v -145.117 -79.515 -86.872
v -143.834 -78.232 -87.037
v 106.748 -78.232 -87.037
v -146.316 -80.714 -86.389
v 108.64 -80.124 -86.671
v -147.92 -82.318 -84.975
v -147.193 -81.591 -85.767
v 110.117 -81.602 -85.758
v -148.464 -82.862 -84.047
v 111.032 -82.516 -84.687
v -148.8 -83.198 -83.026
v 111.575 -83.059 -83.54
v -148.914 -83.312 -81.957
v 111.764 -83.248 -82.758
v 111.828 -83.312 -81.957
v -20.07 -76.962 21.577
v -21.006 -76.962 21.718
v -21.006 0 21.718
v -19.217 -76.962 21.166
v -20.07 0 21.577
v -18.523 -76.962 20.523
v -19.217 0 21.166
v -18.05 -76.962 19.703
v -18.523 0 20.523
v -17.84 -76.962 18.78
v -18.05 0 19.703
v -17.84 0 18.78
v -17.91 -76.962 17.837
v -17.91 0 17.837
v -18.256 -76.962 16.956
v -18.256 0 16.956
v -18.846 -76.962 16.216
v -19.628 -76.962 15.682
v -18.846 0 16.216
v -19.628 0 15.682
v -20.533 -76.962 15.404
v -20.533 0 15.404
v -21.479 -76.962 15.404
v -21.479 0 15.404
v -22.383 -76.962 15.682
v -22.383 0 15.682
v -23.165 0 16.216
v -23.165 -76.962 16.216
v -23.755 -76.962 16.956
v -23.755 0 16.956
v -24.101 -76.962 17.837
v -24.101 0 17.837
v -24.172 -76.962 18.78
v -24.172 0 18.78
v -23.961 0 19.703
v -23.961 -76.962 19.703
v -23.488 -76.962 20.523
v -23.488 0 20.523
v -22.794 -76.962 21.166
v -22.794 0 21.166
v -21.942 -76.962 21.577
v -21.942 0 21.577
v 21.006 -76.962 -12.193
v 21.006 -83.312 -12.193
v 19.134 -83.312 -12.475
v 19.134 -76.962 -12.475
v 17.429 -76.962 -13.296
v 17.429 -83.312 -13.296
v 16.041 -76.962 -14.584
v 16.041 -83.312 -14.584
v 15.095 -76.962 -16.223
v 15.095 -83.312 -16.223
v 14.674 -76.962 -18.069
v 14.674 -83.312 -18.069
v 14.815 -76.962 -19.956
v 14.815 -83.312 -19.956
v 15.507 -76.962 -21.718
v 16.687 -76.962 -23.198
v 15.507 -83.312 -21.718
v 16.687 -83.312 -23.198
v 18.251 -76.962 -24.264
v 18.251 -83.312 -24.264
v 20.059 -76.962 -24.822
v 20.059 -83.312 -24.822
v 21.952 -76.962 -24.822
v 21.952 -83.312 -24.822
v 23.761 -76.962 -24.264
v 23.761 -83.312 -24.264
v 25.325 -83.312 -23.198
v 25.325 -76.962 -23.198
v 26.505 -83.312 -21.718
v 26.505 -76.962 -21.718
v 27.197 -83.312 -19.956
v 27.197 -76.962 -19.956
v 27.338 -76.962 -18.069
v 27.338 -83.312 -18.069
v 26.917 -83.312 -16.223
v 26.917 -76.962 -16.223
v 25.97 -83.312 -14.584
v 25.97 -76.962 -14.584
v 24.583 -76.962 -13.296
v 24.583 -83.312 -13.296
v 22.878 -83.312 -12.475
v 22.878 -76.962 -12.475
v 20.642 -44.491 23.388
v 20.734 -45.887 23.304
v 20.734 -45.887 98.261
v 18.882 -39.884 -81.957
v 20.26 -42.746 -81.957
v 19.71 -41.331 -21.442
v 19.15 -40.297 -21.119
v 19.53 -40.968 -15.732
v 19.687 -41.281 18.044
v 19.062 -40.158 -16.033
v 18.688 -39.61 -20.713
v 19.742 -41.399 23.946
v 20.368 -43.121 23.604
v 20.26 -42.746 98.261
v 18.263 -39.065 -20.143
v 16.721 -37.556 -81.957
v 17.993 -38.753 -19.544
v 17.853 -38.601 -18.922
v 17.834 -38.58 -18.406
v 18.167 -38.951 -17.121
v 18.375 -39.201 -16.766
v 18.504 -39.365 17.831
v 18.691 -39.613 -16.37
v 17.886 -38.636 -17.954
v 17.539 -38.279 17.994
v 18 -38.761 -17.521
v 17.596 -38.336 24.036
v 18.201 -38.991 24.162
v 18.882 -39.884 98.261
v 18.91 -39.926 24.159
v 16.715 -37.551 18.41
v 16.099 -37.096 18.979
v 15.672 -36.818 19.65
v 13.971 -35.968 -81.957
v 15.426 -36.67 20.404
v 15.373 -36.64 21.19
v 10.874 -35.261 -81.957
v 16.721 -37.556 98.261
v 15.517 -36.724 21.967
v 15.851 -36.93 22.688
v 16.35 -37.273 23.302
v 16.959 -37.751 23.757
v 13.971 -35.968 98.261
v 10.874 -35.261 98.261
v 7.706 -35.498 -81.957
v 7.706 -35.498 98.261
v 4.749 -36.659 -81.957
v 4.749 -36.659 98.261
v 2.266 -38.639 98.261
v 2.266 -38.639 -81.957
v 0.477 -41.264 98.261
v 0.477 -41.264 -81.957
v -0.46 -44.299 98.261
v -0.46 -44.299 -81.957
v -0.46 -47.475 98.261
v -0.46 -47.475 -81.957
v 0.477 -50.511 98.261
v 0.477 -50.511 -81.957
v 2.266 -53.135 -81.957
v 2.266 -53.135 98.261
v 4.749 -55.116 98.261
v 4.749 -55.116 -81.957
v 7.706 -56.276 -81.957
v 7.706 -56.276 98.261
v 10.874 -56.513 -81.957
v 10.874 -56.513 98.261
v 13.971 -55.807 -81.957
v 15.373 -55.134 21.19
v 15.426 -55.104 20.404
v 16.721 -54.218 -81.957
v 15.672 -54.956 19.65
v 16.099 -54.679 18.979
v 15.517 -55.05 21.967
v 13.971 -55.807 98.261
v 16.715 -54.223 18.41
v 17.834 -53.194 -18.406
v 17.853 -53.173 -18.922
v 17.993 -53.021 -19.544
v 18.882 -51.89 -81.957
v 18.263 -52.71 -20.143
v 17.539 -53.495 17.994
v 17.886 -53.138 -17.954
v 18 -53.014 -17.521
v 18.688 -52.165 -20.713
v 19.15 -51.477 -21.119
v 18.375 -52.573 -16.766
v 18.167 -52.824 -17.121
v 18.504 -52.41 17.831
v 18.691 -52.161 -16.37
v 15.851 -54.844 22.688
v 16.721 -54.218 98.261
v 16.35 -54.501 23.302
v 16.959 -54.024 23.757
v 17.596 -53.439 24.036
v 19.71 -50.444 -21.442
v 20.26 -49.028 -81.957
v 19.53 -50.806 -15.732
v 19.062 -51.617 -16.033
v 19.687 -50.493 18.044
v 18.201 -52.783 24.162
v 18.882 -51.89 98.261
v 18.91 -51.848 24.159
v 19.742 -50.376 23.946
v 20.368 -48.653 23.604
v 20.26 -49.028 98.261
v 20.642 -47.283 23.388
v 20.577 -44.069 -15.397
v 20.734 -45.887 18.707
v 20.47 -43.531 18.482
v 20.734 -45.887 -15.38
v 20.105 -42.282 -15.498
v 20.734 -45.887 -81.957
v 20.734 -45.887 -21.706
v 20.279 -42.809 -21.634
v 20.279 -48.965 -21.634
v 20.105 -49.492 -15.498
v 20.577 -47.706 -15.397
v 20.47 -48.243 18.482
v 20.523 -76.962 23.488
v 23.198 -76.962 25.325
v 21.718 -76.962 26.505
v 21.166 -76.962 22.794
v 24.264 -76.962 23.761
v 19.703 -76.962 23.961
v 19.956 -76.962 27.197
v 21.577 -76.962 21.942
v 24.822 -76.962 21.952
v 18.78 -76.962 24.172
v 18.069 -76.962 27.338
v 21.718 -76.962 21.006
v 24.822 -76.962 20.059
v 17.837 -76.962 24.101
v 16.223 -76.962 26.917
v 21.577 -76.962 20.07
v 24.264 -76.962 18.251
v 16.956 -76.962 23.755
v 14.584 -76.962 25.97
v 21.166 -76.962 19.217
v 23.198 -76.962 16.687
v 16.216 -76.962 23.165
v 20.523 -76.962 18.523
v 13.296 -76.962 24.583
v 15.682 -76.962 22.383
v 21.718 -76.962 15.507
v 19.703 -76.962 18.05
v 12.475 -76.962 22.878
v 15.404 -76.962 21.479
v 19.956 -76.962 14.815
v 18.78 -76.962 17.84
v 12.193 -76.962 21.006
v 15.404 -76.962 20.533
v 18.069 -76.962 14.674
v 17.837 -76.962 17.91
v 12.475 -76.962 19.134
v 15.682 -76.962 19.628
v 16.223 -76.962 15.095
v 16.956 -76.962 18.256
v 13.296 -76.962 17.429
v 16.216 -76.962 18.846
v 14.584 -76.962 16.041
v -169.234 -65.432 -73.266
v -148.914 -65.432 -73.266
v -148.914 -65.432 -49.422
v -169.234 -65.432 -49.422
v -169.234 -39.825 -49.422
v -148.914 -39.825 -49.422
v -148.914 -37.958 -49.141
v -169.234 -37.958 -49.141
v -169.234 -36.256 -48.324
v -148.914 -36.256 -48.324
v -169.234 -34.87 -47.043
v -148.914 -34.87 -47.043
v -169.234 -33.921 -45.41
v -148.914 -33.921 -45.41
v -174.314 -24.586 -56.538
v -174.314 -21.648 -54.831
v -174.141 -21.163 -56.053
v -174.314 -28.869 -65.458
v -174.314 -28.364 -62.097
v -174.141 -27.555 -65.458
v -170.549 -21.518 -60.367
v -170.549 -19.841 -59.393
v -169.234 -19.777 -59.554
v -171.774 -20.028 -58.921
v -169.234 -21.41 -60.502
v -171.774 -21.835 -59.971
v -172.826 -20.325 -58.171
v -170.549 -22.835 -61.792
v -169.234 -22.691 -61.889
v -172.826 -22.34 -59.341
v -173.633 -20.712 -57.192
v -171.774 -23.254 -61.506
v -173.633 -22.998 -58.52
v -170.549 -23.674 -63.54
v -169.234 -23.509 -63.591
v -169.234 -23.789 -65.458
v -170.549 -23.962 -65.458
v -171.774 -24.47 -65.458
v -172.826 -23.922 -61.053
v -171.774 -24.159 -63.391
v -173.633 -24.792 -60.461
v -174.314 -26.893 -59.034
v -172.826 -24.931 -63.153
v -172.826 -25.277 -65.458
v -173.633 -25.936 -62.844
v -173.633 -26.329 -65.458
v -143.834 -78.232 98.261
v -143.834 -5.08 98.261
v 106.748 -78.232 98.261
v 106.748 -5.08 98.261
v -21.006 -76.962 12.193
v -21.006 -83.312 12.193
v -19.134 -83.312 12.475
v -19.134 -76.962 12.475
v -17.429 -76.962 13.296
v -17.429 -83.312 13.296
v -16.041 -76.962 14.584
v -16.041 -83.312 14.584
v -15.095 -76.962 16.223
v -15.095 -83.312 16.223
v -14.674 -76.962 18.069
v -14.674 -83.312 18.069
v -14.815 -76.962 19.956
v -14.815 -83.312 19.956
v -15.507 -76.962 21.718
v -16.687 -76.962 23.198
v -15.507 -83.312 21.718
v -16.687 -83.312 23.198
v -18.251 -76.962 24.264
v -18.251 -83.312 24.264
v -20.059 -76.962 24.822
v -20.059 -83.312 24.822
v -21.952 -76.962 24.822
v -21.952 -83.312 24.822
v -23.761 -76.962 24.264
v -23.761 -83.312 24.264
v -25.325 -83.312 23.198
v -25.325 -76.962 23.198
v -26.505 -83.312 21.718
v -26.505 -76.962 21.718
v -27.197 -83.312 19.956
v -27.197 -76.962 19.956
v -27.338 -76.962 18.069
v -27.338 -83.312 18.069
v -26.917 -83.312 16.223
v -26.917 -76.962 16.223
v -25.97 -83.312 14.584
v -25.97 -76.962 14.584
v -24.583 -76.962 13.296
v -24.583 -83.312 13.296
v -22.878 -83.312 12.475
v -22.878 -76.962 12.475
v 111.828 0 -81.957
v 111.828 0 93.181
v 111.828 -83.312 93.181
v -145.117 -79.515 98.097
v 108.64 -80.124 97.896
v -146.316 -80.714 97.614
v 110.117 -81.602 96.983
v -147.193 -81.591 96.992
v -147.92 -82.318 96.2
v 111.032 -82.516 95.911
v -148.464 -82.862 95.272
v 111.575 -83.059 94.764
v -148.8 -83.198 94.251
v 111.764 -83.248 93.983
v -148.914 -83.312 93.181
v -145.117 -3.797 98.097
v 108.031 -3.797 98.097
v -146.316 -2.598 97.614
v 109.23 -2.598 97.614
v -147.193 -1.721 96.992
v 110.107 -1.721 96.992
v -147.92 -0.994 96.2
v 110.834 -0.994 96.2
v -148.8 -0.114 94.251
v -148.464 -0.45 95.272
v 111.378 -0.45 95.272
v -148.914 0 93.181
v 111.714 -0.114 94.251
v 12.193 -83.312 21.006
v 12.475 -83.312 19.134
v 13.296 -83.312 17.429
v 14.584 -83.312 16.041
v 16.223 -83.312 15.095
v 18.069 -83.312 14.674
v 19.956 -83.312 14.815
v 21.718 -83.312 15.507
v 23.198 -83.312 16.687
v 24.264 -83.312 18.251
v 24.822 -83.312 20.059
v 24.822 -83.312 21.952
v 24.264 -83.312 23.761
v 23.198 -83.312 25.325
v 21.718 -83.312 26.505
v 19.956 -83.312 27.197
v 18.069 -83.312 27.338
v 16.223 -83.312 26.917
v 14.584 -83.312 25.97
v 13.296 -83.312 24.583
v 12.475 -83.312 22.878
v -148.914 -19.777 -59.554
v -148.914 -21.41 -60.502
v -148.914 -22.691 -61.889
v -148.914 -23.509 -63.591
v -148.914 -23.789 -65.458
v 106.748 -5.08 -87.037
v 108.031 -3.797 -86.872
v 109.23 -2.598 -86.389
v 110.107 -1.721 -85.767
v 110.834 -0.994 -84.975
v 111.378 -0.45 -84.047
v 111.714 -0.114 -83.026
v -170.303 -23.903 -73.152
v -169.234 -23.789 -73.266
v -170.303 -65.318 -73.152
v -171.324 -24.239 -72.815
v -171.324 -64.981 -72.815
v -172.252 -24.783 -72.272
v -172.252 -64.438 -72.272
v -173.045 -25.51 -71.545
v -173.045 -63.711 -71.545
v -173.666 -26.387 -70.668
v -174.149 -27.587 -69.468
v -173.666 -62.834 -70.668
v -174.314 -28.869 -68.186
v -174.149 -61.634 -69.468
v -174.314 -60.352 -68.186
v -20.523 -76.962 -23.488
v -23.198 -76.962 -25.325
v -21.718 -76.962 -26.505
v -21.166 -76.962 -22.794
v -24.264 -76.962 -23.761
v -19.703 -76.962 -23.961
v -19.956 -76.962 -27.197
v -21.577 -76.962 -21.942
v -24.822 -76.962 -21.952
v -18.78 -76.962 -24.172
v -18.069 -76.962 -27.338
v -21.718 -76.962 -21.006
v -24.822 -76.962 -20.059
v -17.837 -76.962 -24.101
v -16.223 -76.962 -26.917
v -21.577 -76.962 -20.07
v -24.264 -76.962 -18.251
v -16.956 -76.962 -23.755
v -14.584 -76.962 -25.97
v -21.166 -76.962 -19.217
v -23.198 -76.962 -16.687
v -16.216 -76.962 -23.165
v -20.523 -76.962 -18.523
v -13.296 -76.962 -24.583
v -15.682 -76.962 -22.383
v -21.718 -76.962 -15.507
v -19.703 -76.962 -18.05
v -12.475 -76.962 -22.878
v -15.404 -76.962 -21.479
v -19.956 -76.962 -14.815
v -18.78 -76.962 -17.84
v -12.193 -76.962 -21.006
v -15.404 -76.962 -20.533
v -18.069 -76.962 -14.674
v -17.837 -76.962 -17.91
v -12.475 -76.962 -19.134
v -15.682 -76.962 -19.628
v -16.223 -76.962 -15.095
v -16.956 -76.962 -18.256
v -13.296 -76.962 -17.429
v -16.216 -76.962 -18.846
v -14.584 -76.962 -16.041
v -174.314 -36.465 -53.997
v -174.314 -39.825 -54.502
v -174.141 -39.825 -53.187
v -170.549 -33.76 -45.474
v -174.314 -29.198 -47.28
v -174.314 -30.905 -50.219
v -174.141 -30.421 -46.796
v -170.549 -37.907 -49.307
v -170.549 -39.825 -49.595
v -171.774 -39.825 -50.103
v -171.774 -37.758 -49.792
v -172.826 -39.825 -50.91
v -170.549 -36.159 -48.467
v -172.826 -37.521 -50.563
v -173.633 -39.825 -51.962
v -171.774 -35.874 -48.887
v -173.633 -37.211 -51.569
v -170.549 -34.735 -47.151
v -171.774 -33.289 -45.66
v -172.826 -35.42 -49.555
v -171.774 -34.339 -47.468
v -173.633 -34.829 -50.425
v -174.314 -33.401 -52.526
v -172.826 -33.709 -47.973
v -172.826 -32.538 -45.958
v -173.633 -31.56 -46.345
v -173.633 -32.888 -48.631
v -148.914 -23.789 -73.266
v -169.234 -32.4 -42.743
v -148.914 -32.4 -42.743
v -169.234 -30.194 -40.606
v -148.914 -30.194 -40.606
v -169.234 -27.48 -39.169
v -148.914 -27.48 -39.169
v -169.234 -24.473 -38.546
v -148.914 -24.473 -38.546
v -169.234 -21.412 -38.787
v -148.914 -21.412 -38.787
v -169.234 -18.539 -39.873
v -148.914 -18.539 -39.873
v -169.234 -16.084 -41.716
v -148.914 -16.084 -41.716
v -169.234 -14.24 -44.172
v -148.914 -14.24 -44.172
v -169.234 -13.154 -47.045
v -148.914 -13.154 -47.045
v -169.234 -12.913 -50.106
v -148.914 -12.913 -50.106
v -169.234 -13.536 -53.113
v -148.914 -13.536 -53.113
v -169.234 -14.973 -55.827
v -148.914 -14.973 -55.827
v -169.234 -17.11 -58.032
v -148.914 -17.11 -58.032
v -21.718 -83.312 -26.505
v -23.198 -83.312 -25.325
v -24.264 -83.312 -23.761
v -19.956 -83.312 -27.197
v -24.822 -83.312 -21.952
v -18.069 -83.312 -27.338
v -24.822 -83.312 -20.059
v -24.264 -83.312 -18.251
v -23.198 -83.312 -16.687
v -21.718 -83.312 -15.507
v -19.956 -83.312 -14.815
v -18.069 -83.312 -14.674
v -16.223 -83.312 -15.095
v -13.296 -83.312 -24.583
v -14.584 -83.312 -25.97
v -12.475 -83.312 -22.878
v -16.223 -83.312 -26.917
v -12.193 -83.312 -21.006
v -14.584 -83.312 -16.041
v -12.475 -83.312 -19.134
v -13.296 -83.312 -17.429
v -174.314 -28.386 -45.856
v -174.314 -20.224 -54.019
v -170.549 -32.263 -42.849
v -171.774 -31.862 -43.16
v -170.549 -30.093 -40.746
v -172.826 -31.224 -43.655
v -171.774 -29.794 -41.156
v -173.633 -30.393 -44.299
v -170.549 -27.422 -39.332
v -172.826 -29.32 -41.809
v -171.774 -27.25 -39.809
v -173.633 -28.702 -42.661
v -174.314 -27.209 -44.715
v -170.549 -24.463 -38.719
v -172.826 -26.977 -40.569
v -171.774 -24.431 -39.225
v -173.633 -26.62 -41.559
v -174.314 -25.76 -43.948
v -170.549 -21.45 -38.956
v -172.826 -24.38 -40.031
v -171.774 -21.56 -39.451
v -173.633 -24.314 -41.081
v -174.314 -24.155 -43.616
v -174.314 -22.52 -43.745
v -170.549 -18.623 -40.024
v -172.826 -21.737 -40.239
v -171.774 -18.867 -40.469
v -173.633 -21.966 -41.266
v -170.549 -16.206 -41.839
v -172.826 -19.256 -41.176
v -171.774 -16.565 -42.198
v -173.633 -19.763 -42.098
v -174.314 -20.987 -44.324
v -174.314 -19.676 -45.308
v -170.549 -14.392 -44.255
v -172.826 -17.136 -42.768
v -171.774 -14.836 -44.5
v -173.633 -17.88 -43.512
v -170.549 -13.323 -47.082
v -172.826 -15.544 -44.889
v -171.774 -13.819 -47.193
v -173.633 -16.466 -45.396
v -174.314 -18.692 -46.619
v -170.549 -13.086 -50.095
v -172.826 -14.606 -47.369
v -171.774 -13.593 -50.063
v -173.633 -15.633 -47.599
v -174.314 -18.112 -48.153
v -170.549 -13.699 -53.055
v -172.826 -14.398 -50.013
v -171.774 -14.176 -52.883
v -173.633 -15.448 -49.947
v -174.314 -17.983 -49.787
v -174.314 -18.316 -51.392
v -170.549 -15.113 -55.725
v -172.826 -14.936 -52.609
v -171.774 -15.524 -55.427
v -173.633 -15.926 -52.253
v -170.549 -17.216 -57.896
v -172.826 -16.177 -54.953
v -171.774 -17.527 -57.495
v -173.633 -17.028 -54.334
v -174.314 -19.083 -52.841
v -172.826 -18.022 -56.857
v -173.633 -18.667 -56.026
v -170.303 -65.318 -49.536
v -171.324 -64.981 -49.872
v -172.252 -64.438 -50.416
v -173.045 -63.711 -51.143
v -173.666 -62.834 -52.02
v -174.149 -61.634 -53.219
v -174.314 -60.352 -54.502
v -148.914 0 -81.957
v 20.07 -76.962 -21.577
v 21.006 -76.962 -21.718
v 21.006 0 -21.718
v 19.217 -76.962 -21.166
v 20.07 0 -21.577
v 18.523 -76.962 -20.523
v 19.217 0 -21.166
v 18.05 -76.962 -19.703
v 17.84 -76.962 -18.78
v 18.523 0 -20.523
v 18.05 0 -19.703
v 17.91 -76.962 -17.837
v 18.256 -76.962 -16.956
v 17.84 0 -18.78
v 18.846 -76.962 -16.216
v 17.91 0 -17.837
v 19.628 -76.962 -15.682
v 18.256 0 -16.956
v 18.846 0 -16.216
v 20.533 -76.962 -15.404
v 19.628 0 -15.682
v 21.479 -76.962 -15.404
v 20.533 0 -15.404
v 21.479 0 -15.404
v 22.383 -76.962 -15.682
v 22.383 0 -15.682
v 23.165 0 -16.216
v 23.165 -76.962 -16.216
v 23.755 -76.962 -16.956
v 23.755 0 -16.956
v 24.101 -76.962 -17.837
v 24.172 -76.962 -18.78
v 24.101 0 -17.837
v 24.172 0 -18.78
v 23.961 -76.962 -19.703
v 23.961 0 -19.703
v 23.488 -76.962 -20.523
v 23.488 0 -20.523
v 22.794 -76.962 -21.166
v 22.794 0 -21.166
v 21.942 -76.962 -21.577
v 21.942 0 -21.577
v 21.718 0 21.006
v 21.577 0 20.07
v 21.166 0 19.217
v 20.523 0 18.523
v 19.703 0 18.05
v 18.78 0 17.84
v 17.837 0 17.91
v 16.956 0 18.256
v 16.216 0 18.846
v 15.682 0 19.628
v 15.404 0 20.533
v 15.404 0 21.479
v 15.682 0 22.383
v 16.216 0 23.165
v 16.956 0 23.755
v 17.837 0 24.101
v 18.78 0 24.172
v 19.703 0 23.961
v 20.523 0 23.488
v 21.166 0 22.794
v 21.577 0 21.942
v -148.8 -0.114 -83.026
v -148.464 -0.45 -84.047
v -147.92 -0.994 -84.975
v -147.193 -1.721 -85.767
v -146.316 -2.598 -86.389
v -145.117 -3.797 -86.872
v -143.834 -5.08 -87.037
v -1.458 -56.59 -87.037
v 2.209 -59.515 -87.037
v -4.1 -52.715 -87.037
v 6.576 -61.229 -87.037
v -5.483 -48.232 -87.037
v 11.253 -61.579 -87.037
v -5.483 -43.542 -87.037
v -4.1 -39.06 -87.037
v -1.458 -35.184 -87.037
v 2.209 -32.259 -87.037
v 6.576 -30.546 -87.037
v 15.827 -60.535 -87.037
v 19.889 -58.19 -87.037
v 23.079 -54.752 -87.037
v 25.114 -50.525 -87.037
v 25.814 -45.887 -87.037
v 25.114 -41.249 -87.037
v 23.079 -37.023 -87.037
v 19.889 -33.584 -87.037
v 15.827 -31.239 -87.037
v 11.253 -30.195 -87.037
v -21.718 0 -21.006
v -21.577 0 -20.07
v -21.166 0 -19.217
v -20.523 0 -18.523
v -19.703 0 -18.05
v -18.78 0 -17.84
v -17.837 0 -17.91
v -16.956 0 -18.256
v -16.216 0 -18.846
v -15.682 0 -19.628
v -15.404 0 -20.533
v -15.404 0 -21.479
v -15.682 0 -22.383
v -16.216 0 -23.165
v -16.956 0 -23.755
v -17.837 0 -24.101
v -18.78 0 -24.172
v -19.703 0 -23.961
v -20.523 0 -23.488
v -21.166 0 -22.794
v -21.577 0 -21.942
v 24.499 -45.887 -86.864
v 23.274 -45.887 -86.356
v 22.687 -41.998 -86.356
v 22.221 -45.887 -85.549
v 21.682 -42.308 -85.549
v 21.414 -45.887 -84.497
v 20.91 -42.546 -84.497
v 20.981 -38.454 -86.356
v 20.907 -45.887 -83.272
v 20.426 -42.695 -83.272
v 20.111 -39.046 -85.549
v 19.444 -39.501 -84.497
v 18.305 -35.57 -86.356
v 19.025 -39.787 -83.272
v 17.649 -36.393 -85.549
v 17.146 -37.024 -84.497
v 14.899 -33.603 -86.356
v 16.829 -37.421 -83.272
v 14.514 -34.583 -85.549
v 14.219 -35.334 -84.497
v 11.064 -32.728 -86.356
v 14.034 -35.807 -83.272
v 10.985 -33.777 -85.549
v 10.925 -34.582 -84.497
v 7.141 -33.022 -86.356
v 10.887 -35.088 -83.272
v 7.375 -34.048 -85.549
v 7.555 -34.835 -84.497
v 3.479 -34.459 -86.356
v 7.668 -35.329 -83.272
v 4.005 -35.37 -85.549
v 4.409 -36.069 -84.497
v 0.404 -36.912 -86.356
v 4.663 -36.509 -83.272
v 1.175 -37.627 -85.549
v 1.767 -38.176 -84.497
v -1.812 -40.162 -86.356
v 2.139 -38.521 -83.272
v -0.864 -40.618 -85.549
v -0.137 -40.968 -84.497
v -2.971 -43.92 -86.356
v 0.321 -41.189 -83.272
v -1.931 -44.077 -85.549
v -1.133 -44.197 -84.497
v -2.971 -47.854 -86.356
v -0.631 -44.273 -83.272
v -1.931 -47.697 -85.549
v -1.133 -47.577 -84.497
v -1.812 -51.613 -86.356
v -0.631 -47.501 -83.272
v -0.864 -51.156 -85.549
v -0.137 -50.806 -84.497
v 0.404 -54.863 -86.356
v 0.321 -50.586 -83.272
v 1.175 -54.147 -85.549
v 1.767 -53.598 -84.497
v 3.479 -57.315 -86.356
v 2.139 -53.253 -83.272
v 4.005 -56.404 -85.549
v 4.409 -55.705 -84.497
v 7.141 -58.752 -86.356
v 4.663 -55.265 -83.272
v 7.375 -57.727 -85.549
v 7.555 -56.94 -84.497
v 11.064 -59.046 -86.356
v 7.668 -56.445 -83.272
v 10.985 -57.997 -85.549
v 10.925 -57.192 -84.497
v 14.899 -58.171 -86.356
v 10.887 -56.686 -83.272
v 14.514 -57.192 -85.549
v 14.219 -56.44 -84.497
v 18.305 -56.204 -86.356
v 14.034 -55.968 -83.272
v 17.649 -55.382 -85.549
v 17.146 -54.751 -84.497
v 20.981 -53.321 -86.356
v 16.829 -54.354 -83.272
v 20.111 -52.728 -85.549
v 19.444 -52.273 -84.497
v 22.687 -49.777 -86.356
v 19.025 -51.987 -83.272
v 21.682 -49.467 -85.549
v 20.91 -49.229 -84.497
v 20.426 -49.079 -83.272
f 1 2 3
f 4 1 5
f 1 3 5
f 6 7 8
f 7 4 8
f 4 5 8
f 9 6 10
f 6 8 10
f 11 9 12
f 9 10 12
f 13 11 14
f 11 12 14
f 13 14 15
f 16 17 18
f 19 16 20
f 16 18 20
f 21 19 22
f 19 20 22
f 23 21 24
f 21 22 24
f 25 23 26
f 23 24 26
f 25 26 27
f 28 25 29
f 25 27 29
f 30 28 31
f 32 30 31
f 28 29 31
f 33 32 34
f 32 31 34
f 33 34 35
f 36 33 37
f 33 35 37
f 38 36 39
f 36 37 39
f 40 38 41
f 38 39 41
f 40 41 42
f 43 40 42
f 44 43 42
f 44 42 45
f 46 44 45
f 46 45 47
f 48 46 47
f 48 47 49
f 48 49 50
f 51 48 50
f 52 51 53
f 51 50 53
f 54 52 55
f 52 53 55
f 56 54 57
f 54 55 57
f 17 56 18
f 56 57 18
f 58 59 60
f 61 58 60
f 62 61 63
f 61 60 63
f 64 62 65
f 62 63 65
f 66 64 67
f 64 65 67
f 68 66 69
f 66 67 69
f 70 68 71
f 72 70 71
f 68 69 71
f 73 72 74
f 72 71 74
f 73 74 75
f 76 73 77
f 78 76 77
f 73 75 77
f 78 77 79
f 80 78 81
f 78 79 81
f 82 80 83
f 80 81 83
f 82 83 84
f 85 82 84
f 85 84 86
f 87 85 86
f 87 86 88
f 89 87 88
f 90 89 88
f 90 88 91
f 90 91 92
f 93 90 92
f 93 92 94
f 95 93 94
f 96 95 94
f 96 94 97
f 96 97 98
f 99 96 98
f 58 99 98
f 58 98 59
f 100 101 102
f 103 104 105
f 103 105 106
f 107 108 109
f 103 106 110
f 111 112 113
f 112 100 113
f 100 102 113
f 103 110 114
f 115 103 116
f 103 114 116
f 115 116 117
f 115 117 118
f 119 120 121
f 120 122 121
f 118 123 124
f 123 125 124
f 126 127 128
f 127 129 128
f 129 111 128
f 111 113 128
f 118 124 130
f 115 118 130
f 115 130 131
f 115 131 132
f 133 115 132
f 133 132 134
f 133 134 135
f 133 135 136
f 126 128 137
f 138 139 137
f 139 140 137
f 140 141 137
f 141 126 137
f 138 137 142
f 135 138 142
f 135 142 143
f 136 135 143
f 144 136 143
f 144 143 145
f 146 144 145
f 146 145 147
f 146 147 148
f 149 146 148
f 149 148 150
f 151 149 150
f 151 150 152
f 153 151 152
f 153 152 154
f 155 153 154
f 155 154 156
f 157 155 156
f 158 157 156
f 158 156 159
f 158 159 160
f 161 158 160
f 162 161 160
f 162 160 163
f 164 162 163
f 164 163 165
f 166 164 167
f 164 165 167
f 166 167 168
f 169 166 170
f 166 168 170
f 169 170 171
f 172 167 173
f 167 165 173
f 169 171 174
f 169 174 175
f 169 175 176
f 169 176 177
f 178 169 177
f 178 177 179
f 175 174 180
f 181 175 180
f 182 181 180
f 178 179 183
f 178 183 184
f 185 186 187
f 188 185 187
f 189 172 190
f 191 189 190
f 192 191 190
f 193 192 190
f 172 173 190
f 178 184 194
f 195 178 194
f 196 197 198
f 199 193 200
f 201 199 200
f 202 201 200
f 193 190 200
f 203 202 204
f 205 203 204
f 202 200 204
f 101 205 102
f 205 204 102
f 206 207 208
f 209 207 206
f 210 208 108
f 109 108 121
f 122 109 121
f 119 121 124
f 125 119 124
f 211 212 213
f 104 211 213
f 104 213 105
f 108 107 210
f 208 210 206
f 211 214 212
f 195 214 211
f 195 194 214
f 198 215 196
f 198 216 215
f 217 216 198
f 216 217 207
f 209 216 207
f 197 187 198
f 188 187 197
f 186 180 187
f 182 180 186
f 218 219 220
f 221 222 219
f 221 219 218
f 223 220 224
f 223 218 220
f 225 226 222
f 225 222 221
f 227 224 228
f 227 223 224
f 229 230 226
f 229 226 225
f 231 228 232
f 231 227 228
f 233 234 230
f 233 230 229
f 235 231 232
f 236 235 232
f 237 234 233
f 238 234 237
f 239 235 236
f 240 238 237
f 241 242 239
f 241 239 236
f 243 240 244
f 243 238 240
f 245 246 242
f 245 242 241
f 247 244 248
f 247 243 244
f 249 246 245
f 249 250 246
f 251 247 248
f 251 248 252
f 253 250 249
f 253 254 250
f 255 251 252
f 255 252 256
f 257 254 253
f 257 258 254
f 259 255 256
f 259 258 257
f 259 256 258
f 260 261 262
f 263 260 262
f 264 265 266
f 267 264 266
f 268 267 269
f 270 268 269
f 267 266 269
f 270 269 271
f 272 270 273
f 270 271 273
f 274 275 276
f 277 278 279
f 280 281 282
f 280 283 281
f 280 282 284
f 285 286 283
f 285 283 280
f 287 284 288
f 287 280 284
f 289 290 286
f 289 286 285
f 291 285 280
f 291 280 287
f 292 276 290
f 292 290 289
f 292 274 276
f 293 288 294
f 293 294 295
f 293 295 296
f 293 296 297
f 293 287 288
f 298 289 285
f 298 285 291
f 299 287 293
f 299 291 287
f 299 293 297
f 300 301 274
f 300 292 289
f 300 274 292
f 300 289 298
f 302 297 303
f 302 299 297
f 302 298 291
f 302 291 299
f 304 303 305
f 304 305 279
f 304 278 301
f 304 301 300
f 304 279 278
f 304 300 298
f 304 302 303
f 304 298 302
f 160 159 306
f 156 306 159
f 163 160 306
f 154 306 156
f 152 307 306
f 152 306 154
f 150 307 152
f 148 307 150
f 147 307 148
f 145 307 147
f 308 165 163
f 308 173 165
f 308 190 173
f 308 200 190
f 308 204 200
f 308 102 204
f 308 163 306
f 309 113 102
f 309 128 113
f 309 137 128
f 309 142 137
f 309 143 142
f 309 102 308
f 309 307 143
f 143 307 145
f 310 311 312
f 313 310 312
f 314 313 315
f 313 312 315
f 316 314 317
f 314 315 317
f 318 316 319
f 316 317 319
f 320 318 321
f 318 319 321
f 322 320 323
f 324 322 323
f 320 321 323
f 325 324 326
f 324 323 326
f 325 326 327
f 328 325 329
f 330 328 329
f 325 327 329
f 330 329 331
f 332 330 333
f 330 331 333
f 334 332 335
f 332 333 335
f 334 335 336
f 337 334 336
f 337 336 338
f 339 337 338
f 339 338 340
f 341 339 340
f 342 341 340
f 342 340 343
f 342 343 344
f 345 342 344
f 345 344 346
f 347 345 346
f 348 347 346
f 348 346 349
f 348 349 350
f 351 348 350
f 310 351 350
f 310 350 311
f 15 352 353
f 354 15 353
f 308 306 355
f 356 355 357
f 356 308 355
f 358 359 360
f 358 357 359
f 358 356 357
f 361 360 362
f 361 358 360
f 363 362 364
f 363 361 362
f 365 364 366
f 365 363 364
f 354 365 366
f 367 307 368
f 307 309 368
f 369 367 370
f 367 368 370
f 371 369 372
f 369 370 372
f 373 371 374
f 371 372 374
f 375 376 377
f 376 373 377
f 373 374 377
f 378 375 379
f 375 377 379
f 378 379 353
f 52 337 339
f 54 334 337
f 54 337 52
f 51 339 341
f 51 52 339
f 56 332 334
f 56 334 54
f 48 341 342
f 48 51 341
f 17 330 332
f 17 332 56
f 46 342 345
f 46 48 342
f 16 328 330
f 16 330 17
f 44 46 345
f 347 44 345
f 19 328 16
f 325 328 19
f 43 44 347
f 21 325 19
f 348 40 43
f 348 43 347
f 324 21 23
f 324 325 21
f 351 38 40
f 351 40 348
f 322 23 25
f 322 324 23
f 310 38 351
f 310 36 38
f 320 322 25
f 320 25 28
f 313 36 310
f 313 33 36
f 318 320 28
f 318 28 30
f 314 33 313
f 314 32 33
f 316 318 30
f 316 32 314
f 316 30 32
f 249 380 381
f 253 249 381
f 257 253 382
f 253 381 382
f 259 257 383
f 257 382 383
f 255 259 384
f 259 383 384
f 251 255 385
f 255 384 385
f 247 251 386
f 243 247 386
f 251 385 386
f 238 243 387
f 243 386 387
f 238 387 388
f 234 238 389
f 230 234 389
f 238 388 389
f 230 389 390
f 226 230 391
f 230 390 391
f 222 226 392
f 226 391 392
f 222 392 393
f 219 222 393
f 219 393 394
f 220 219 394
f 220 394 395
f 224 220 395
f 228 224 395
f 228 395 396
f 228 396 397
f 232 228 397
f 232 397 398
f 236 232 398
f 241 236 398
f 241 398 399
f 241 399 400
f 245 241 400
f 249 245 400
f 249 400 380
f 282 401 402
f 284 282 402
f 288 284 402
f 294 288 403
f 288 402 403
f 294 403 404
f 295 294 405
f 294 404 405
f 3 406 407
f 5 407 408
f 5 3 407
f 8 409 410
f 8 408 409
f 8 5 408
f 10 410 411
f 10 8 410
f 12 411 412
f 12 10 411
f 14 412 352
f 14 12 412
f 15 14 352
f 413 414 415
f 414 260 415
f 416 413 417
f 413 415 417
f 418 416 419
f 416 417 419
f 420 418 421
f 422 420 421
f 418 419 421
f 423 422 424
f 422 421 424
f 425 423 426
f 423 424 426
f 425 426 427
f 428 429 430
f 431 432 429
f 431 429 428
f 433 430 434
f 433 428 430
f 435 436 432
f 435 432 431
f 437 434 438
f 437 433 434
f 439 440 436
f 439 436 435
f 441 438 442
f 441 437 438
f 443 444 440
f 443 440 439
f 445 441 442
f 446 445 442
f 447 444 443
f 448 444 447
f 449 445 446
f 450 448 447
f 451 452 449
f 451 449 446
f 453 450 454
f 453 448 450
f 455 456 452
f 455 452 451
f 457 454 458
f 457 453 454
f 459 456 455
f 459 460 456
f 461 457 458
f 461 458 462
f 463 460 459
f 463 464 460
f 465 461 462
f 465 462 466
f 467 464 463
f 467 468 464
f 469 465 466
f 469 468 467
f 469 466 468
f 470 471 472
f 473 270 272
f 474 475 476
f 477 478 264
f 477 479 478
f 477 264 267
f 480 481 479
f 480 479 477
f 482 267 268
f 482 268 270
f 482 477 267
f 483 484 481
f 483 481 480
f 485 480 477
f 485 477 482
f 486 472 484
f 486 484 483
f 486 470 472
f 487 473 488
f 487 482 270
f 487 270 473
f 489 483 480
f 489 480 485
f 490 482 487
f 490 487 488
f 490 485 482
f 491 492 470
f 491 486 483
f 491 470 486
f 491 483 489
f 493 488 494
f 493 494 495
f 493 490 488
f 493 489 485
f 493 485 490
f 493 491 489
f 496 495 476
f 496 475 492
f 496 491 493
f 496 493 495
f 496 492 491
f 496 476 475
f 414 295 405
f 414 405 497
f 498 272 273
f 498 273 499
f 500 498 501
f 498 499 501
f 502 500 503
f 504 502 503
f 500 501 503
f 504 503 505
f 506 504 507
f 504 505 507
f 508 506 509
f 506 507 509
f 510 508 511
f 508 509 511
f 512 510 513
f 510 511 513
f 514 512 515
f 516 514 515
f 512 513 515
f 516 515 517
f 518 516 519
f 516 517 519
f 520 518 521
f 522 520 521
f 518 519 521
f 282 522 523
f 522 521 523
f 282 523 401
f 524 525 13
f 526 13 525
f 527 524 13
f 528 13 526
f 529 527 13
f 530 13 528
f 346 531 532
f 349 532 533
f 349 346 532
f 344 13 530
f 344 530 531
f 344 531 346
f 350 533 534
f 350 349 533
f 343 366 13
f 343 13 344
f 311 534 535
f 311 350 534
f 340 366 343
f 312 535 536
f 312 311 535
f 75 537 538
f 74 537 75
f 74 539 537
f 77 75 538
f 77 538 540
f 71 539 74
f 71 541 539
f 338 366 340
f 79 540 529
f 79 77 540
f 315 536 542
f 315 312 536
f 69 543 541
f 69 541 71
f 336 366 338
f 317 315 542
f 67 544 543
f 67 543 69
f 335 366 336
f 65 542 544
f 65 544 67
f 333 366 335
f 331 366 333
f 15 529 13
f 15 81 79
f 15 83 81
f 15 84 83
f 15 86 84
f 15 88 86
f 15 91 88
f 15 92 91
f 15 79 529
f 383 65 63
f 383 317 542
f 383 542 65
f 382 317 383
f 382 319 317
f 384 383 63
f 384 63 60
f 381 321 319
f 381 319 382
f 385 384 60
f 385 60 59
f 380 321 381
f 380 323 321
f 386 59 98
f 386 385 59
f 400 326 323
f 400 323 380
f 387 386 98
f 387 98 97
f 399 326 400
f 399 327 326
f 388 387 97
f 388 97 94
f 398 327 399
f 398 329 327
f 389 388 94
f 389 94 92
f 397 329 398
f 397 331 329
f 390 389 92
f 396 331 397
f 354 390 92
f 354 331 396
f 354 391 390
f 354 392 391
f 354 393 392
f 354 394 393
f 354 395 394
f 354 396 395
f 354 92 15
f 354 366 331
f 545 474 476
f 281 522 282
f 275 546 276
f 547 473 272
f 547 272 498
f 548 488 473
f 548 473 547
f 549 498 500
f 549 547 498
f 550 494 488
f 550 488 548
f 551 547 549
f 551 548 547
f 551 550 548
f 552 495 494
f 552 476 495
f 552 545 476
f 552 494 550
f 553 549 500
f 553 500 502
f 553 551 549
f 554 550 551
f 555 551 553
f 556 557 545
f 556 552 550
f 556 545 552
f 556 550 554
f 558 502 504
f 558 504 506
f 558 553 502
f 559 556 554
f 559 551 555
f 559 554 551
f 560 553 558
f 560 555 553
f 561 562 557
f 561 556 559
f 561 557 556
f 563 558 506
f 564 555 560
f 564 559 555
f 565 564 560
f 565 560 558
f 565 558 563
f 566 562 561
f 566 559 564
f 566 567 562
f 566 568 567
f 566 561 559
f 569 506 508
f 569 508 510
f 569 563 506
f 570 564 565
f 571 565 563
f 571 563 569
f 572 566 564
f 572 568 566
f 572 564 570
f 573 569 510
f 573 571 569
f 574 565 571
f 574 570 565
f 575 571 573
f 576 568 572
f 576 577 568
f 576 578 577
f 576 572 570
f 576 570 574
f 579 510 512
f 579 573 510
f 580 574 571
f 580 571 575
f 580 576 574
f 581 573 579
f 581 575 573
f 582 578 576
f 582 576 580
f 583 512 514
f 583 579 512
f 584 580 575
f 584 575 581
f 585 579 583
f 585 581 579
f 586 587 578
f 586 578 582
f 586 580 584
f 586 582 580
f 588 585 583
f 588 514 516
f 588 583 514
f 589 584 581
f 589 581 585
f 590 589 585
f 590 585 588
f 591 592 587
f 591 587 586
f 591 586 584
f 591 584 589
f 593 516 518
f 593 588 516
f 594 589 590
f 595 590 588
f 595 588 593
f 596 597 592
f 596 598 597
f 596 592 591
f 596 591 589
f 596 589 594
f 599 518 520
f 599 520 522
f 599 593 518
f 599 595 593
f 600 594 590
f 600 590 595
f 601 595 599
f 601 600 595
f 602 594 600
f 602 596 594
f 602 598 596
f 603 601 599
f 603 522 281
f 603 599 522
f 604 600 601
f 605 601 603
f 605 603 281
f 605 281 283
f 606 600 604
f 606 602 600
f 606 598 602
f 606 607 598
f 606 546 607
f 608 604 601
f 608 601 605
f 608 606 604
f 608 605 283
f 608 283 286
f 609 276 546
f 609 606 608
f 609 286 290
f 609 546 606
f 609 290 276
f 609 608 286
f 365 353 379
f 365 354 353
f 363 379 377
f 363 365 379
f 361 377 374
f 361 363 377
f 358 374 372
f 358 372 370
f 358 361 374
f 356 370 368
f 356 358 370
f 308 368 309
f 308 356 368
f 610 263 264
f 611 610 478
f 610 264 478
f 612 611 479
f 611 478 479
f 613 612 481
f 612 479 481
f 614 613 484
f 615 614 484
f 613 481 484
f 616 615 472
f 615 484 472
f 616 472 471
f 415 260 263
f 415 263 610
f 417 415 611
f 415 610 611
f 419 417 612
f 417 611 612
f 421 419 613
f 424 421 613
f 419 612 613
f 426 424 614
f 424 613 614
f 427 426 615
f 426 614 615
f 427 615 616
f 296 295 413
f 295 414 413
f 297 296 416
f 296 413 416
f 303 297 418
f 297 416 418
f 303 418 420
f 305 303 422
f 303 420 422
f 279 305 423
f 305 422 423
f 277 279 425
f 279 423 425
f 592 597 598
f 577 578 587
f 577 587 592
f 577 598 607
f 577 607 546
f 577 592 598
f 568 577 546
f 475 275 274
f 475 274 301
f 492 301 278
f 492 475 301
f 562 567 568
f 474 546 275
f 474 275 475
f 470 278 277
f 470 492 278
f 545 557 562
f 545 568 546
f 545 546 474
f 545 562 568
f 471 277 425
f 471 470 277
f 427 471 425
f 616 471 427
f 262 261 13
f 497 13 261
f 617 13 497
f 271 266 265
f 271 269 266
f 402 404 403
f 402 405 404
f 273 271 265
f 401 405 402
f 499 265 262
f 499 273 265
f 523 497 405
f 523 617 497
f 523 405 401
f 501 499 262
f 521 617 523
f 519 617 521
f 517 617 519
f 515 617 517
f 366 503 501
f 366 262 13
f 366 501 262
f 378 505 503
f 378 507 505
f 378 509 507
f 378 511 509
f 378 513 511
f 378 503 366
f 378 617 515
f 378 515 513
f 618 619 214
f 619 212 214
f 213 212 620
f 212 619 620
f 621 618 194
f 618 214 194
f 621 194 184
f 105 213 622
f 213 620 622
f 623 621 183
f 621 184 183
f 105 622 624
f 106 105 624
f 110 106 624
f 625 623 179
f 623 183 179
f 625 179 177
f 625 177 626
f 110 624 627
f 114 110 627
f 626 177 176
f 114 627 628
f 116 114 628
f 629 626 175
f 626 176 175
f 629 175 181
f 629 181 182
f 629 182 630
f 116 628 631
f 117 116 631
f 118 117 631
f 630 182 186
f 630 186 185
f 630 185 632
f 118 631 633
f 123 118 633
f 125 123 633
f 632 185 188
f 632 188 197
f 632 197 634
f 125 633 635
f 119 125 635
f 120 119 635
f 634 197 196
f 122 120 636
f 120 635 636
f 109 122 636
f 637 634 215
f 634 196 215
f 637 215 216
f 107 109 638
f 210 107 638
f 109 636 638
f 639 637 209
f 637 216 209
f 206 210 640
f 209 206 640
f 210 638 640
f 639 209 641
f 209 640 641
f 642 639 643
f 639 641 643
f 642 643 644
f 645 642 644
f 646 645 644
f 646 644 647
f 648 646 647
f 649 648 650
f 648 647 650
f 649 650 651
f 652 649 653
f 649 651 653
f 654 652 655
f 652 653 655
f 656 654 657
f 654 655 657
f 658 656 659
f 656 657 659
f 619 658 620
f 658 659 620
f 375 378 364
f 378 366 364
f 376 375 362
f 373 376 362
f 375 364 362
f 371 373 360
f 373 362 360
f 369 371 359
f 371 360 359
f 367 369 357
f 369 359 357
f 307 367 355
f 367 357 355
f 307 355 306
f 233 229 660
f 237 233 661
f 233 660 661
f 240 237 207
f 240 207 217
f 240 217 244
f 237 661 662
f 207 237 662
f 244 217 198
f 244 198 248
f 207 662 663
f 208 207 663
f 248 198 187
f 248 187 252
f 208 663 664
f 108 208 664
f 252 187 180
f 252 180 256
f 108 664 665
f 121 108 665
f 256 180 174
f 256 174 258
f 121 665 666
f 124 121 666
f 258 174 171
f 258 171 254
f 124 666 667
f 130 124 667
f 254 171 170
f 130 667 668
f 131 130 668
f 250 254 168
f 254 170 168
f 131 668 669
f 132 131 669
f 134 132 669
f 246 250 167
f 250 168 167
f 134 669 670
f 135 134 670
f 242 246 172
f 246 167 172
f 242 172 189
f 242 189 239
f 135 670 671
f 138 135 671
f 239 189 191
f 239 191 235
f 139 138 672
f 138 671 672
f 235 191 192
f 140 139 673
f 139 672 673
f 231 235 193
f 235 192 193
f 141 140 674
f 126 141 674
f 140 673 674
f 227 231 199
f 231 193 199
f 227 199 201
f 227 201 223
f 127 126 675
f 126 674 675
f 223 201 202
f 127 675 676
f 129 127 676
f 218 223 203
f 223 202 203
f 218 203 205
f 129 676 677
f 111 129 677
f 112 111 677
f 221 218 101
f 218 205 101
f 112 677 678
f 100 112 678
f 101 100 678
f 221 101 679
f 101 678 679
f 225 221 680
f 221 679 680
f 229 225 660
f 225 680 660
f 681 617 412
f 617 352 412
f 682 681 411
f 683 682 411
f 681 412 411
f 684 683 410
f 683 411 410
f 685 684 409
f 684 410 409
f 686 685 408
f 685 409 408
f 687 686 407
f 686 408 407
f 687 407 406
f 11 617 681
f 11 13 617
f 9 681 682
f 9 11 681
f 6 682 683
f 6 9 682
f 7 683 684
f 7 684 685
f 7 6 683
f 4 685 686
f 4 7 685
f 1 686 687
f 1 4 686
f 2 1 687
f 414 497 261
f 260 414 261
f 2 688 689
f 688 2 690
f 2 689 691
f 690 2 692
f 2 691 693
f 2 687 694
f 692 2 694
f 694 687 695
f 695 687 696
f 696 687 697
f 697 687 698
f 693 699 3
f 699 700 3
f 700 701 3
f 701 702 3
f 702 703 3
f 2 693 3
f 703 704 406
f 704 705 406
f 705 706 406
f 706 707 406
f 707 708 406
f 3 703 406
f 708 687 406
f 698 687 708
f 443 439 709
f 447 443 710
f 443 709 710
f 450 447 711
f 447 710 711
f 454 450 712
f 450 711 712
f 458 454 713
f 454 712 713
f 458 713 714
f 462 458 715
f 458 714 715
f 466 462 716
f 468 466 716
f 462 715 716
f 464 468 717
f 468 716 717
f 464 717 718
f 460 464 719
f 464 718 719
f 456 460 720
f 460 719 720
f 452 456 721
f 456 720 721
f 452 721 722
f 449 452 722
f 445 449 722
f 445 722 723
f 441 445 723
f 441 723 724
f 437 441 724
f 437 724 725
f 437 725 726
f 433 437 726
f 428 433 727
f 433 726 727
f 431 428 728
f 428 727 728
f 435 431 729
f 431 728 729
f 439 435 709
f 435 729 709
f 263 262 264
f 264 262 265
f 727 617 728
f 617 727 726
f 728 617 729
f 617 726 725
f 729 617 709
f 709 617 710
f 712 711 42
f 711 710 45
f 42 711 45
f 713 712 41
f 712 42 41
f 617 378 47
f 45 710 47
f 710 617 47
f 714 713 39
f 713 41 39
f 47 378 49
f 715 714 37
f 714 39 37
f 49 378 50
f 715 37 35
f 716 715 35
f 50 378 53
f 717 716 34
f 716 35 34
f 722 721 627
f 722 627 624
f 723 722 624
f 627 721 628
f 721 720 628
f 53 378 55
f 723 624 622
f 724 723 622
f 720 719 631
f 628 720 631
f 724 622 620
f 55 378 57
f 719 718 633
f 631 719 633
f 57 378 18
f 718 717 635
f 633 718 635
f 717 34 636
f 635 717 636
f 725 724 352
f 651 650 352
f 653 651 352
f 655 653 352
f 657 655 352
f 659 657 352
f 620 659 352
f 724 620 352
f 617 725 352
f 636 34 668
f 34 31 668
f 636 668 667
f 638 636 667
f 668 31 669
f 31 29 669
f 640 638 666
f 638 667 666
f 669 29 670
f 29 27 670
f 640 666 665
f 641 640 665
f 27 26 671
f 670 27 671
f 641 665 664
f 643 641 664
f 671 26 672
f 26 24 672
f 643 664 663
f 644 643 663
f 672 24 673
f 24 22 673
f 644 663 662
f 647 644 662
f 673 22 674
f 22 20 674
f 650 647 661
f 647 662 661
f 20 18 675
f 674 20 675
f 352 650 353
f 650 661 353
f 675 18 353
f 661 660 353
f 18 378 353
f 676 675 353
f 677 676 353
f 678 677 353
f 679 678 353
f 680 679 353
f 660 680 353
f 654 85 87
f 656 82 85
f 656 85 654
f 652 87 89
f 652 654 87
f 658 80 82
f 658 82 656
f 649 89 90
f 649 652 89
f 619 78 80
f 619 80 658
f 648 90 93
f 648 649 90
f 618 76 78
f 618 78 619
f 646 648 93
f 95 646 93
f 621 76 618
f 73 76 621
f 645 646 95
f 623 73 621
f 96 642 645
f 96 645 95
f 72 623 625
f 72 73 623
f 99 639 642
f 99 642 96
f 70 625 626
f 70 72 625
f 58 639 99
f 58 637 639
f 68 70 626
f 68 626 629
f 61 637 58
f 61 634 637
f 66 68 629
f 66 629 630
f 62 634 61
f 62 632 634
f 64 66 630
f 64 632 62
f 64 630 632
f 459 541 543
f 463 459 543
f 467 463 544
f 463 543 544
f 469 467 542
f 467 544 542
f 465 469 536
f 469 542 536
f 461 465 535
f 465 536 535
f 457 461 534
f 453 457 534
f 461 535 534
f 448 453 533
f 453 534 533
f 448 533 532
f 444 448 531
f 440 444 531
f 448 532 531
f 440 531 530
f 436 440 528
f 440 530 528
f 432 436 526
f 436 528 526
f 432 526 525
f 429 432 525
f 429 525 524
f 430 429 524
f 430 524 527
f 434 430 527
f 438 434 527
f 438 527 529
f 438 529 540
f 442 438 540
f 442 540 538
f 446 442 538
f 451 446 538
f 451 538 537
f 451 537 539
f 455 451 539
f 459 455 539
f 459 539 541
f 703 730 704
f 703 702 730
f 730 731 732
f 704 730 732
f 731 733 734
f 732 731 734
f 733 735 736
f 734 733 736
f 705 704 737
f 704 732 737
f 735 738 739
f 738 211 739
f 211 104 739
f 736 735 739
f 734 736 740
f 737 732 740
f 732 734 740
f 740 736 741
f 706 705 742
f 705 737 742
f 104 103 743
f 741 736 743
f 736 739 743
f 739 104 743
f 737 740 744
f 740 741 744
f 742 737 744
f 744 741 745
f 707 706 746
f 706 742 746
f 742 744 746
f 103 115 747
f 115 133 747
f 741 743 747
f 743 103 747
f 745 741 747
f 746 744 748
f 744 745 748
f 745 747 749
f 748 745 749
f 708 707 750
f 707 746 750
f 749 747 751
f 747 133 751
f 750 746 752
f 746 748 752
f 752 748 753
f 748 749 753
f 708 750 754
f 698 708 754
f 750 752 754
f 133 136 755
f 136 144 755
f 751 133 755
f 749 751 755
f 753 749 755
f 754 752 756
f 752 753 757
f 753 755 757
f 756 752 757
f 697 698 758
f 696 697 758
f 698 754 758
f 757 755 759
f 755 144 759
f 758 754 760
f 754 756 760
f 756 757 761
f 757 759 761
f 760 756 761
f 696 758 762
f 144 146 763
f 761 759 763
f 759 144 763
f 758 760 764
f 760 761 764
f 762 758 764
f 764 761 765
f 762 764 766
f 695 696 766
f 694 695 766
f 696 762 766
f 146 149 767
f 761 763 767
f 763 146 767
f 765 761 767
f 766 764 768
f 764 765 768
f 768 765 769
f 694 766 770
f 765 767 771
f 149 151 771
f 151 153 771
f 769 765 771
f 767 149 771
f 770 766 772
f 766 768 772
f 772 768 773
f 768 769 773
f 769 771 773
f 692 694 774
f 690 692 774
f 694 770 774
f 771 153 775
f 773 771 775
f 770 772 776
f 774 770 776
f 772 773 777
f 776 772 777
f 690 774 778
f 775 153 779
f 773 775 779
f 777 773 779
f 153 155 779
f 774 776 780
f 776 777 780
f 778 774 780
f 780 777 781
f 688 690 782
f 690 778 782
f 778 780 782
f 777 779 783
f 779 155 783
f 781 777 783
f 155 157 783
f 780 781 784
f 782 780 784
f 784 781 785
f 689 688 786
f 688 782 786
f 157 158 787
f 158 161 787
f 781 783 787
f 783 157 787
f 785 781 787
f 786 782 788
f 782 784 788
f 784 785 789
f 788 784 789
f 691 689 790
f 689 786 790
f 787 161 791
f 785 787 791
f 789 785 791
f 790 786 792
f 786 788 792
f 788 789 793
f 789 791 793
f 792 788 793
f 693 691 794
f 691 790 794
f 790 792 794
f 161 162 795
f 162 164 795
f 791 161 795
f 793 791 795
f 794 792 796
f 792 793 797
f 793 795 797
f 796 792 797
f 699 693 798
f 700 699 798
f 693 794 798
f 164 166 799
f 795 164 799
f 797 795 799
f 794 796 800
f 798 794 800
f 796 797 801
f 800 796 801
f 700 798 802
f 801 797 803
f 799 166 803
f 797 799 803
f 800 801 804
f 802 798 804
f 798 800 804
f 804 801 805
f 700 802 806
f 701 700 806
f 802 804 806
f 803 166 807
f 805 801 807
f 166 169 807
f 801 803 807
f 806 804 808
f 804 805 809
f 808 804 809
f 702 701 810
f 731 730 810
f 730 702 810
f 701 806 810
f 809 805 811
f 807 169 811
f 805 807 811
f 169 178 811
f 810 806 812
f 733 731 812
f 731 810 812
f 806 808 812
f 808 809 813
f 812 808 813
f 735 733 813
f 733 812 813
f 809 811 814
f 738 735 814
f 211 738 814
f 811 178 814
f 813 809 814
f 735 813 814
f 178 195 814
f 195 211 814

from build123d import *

# Parameters (mm, degrees)
F0_W            = 260.7417907566
F0_H            = 185.2982528508
F1_DEPTH        = 83.312
F2_R            = 5.08
F3_R            = 10.6560791483
F4_DEPTH        = 185.2982528508
F6_DEPTH        = 25.4
F7_R            = 5.08
F9_D            = 6.35
F9_CBORE_D      = 12.7
F9_CBORE_DEPTH  = 6.35
F9_COPIES_COUNT = 4


# Not quite as in the source:
# - a pattern or mirror of a feature is missing from the dataset's text; its kind, count and spacing are read off the source's solid


with BuildPart() as f1:
    # F0 (on Front) → F1 (new body)
    with BuildSketch(Plane.XZ):
        with Locations((-18.5430413112, 5.6122671813)):
            Rectangle(F0_W, F0_H)
    extrude(amount=F1_DEPTH)

    # F2
    f2_edges = [f1.edges().sort_by_distance(p)[0] for p in [
        (-148.913937, -41.656, 98.261394),
        (-18.543041, -83.312, 98.261394),
        (111.827854, -41.656, 98.261394),
        (-18.543041, 0, 98.261394),
    ]]
    fillet(f2_edges, radius=F2_R)

    # F3 (on face) → F4 (cut, through all)
    with BuildSketch(Plane.XY.offset(98.2613936067)):
        with Locations((10.0774681196, -45.8871424198)):
            Circle(F3_R)
    extrude(amount=-F4_DEPTH, mode=Mode.SUBTRACT)

    # F5 (on face) → F6 (join)
    with BuildSketch(Plane(origin=(-148.9139366895, 0, 0), x_dir=(0, -1, 0), z_dir=(-1, 0, 0))):
        with BuildLine():
            ThreePointArc((39.8253589774, -49.4220387191), (36.2562578791, -48.3240875907), (33.9213925534, -45.4099181994))
            ThreePointArc((33.9213925534, -45.4099181994), (16.0837066862, -41.7163656596), (19.777259226, -59.5540515267))
            ThreePointArc((19.777259226, -59.5540515267), (22.6914286173, -61.8889168524), (23.7893797457, -65.4580179507))
            Line((23.7893797457, -65.4580179507), (23.7893797457, -73.2655222528))
            Line((23.7893797457, -73.2655222528), (65.4315222055, -73.2655222528))
            Line((65.4315222055, -73.2655222528), (65.4315222055, -49.4220387191))
            Line((65.4315222055, -49.4220387191), (39.8253589774, -49.4220387191))
        make_face()
    extrude(amount=F6_DEPTH)

    # F7
    f7_edges = [f1.edges().sort_by_distance(p)[0] for p in [
        (-174.313937, -65.431522, -61.34378),
        (-174.313937, -52.628441, -49.422039),
        (-174.313937, -36.256258, -48.324088),
        (-174.313937, -16.083707, -41.716366),
        (-174.313937, -22.691429, -61.888917),
        (-174.313937, -23.78938, -69.36177),
        (-174.313937, -44.610451, -73.265522),
        (-148.913937, -41.656, -87.036859),
        (-18.543041, 0, -87.036859),
        (-18.543041, -83.312, -87.036859),
        (111.827854, -41.656, -87.036859),
        (-0.578611, -45.887142, -87.036859),
    ]]
    fillet(f7_edges, radius=F7_R)

    # F9 (through all)
    with Locations(Plane.XZ.offset(83.312)):
        with Locations((-18.5430413112, -21.0058055818)):
            f9 = CounterBoreHole(F9_D / 2, F9_CBORE_D / 2, F9_CBORE_DEPTH)

    # F9_copies: F9 ×4 about axis
    f9_copies_axis = Axis((0, 0, 0), (0, 1, 0))
    for i in range(1, F9_COPIES_COUNT):
        add(f9.rotate(f9_copies_axis, i * 360 / F9_COPIES_COUNT), mode=Mode.SUBTRACT)


solid = f1.part
